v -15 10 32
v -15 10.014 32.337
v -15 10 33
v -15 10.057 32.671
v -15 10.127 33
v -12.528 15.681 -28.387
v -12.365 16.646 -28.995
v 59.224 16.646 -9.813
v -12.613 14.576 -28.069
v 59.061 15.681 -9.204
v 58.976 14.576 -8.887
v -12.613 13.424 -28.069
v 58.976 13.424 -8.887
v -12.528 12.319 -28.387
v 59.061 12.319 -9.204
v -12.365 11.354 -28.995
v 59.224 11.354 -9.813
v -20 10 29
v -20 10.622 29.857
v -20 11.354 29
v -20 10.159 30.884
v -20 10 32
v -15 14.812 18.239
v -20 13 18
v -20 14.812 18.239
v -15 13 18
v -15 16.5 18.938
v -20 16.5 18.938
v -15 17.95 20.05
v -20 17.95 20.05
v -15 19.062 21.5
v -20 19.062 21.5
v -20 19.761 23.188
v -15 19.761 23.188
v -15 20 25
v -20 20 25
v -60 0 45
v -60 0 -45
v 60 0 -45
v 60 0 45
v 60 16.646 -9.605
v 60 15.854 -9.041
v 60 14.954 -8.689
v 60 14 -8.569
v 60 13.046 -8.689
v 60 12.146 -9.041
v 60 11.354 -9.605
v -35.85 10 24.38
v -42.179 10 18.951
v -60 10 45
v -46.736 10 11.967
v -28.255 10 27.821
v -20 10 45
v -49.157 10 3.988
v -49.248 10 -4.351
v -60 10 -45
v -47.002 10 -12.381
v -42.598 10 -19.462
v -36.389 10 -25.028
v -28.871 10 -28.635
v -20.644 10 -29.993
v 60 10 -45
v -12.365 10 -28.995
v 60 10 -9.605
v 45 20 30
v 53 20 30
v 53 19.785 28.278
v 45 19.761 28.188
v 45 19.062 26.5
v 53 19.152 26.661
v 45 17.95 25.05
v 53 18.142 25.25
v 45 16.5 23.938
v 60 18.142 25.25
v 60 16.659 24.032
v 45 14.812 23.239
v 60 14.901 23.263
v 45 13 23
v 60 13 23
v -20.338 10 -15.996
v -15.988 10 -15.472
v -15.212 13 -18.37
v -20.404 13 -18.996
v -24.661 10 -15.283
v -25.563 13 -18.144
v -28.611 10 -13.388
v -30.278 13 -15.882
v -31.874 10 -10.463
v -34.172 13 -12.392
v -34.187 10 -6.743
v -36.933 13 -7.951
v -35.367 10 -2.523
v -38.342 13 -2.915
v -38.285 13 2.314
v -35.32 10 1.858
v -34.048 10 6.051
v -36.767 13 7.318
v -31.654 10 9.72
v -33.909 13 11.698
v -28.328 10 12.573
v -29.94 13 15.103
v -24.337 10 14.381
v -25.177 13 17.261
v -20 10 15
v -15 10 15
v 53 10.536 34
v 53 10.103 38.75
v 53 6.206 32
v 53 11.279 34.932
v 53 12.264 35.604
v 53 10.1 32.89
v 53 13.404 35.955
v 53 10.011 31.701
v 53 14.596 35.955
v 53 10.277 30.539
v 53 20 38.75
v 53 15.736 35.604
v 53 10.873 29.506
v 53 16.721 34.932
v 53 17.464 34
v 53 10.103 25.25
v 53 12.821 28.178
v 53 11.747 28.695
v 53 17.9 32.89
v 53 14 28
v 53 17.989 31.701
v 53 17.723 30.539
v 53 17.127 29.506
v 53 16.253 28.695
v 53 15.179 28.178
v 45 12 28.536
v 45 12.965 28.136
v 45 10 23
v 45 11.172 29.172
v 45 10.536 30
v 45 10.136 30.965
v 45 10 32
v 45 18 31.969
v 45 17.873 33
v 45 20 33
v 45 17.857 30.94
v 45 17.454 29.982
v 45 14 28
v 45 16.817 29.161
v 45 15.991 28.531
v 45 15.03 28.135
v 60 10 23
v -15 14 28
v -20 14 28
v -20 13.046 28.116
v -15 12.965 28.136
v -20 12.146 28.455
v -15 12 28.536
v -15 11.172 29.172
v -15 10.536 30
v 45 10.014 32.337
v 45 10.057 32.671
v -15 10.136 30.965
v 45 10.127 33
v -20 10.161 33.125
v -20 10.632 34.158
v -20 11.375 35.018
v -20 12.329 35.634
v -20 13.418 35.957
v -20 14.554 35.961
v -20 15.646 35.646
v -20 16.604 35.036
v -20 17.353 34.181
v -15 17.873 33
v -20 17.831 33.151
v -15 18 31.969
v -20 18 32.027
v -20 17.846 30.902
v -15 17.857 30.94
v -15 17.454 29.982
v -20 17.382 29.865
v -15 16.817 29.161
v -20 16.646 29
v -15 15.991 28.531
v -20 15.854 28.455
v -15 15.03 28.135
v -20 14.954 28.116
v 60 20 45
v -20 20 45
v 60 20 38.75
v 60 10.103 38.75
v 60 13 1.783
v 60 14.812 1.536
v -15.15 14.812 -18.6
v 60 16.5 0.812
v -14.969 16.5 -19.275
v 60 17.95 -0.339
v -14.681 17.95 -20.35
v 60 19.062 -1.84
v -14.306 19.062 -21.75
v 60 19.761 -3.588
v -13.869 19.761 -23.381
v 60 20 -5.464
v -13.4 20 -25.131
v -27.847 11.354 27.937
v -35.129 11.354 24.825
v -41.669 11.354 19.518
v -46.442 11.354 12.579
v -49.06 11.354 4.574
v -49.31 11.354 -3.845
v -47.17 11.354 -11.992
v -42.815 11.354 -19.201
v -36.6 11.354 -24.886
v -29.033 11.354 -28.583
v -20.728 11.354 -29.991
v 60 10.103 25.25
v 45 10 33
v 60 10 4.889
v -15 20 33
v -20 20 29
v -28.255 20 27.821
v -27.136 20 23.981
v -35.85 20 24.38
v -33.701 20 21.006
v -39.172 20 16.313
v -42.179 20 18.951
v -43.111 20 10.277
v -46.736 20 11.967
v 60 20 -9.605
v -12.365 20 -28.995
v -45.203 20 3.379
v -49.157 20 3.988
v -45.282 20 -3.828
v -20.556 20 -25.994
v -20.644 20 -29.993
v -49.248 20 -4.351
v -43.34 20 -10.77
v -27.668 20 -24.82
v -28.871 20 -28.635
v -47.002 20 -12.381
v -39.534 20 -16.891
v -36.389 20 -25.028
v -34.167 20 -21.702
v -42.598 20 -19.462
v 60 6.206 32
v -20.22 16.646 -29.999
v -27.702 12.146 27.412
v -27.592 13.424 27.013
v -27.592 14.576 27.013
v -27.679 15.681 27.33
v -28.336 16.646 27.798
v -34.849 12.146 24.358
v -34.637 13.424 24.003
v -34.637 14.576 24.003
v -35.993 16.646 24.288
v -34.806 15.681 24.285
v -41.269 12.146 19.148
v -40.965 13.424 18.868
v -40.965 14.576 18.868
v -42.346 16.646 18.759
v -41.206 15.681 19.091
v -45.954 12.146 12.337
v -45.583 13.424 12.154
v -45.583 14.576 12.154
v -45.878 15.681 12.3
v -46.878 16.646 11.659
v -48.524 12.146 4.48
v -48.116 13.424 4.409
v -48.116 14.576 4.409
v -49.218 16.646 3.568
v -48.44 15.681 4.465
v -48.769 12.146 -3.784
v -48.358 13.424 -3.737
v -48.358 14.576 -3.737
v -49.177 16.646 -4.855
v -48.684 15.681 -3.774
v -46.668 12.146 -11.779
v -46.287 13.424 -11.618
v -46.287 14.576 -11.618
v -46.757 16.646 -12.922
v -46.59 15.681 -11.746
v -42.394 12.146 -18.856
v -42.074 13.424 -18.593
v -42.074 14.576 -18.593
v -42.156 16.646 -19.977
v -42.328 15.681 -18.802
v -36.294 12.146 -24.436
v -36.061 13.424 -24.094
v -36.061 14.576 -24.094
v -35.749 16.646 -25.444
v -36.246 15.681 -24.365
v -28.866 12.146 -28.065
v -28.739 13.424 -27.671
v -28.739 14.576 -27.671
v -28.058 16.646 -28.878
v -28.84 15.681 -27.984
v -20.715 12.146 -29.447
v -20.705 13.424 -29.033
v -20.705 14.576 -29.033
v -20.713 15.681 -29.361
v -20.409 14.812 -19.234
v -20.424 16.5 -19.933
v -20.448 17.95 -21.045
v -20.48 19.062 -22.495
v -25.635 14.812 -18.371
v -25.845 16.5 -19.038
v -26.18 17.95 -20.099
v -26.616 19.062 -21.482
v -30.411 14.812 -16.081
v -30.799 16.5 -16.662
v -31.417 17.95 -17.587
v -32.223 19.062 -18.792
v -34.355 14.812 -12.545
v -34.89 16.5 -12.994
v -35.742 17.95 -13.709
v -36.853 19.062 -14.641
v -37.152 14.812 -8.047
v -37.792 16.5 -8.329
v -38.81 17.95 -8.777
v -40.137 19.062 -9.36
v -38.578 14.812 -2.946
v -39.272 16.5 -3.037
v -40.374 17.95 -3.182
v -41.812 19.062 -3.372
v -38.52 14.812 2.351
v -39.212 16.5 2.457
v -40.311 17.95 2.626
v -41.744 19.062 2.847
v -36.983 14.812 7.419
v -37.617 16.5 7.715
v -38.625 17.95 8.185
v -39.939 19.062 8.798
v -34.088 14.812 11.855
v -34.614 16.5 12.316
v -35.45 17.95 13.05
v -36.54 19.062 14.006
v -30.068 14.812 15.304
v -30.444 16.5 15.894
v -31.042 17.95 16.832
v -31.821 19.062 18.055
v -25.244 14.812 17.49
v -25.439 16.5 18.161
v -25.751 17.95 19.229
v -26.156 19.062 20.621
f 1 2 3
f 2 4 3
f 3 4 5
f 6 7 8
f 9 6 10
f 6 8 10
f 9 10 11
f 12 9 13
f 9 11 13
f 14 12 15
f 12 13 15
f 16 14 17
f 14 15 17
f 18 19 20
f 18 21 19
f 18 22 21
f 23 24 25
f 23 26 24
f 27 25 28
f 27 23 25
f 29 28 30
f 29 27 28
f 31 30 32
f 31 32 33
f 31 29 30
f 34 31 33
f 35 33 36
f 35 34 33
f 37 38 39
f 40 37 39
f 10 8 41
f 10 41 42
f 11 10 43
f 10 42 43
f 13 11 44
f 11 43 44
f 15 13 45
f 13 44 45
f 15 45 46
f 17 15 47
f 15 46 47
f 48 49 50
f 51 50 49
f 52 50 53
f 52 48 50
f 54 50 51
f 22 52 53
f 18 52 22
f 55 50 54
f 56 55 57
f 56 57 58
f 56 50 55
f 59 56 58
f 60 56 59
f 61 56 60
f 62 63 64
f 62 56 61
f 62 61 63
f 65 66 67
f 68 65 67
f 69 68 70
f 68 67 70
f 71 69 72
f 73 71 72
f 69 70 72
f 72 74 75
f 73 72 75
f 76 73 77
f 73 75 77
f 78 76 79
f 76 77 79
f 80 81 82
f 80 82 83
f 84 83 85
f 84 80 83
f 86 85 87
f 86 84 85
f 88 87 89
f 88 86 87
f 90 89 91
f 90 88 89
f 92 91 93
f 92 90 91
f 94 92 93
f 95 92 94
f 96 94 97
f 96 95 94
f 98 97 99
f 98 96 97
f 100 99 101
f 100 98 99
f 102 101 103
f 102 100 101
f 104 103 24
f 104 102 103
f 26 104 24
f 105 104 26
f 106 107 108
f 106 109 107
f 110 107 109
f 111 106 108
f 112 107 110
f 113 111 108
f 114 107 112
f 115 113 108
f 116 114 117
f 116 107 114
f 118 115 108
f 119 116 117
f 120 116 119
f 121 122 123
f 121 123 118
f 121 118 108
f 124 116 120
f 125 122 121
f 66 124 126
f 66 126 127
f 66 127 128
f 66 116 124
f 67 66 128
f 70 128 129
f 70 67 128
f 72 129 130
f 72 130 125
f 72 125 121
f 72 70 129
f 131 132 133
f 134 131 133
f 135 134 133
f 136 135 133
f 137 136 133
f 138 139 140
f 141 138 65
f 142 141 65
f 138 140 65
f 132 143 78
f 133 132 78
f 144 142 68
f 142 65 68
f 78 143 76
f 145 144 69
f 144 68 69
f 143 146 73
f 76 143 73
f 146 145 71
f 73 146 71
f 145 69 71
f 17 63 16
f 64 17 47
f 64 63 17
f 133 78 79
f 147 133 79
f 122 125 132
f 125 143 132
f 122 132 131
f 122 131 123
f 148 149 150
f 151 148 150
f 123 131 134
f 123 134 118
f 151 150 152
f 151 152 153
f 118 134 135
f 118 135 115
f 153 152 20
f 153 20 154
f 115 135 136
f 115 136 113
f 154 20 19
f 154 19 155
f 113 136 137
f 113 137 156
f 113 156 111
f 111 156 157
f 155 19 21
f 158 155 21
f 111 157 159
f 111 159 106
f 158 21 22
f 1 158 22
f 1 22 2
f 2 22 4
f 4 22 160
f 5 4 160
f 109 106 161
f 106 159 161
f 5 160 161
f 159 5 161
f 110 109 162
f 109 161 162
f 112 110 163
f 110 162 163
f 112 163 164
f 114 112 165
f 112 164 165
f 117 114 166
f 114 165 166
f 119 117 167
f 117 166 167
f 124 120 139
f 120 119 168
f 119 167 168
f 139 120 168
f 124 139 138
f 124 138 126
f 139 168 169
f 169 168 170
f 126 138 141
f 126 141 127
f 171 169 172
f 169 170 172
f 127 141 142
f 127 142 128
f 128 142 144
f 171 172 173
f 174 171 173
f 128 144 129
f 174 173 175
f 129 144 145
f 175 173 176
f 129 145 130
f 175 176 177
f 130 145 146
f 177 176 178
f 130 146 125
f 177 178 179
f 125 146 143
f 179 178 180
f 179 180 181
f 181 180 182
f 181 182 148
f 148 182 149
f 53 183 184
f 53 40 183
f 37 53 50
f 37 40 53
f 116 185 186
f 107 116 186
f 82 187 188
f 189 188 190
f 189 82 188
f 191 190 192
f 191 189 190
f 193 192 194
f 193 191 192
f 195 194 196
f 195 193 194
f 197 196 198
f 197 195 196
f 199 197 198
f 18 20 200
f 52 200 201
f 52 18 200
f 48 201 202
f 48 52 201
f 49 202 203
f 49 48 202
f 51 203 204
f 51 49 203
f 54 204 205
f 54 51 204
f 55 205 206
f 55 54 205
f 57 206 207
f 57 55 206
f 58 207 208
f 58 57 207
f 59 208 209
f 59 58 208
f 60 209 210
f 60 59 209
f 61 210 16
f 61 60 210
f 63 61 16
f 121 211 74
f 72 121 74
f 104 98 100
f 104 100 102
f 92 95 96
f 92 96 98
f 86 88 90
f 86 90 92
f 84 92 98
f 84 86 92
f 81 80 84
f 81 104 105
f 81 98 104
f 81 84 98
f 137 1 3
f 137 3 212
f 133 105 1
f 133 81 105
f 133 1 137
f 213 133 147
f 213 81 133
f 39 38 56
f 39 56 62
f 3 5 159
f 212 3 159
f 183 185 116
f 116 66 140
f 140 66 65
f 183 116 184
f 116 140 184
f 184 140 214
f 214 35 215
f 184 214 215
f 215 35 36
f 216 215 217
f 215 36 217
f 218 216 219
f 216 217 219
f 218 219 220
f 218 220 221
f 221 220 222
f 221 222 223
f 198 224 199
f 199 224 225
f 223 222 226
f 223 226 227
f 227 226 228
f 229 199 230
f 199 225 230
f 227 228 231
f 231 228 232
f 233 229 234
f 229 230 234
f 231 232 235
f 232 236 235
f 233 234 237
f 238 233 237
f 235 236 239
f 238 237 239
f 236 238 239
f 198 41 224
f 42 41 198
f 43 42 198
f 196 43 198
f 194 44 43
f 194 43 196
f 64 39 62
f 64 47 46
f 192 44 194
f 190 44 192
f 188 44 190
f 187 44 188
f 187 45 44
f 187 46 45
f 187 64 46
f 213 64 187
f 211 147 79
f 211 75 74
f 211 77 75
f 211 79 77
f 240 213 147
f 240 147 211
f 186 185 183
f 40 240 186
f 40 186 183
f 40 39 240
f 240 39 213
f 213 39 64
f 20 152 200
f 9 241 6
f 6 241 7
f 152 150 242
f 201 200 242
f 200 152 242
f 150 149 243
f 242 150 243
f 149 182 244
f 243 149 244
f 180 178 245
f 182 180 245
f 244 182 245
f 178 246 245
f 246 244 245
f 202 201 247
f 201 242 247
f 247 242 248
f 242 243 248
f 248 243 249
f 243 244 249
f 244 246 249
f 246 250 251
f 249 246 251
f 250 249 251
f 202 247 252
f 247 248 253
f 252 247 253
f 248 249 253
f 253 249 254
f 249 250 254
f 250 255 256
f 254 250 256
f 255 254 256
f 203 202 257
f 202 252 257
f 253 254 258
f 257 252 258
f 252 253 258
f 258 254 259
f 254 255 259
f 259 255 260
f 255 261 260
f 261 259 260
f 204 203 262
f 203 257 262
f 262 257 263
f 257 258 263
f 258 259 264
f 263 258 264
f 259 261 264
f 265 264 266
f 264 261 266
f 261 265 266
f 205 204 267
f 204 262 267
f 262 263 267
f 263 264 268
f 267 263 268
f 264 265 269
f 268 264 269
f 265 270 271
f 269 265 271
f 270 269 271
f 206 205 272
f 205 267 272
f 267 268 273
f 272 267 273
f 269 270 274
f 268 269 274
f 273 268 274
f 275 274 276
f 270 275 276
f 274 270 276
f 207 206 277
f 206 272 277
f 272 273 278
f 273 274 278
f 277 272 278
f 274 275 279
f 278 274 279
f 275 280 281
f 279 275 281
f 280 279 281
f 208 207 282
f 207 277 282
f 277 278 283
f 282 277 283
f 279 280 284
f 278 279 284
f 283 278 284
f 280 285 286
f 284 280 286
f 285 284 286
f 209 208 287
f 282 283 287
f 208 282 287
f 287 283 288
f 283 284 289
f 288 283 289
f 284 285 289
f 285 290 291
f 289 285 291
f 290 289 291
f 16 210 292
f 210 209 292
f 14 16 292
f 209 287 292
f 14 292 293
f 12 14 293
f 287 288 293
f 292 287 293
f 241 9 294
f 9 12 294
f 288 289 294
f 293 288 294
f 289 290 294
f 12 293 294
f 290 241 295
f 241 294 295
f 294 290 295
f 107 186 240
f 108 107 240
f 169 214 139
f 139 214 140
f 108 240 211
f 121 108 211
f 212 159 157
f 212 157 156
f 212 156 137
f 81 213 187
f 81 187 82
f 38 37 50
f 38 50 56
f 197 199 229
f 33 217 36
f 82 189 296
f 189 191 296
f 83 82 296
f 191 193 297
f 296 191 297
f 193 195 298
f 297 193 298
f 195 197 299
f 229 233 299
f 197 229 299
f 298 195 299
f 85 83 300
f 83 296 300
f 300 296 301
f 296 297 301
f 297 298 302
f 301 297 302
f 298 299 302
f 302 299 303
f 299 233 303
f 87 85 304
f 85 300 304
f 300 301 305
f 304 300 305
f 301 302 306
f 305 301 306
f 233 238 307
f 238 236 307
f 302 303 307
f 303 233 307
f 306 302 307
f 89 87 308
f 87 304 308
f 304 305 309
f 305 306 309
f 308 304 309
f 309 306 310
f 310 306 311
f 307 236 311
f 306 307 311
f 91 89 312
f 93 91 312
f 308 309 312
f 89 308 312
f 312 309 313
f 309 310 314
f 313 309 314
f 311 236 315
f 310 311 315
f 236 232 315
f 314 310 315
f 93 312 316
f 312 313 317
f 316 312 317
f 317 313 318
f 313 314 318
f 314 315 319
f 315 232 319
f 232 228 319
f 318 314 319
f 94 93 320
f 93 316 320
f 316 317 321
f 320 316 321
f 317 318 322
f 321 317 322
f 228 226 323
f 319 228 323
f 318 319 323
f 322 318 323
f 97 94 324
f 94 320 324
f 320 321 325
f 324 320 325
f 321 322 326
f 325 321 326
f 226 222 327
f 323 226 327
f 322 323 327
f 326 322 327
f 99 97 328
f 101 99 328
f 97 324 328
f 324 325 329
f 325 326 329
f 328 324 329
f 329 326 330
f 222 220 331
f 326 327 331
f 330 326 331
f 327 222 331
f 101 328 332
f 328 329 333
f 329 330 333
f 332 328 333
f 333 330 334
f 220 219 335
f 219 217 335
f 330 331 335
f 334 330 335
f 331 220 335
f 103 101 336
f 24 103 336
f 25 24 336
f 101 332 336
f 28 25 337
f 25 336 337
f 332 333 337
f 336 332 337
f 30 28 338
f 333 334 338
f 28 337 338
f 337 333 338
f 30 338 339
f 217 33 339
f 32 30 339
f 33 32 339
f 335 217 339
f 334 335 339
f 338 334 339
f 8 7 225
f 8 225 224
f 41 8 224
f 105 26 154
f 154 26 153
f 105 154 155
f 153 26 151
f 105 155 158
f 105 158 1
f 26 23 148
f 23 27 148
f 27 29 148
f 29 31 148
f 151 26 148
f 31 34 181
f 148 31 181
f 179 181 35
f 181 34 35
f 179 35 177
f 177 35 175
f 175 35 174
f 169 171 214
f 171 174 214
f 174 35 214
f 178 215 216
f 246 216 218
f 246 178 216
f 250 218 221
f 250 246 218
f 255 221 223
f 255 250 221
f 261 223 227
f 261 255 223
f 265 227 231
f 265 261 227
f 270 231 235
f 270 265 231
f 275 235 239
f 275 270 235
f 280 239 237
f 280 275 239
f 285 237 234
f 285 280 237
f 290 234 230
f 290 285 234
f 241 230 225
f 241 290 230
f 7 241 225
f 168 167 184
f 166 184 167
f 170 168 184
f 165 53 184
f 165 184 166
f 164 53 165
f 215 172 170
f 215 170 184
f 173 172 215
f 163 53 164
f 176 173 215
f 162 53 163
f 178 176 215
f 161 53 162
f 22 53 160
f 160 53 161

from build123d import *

# Parameters (mm, degrees)
SKETCH1_W           = 120
SKETCH1_H           = 90
BOSS_EXTRUDE1_DEPTH = 10
BOSS_EXTRUDE2_DEPTH = 10
SKETCH3_R           = 4
CUT_EXTRUDE1_DEPTH  = 10
CHAMFER2_SIZE       = 3
FILLET1_R           = 7
CUT_EXTRUDE2_DEPTH  = 7


with BuildPart() as part:
    # Sketch1 → Boss-Extrude1 (new body)
    with BuildSketch(Plane(origin=(0, 0, 0), x_dir=(1, 0, 0), z_dir=(0, 1, 0))):
        Rectangle(SKETCH1_W, SKETCH1_H)
    extrude(amount=BOSS_EXTRUDE1_DEPTH)

    # Sketch2 → Boss-Extrude2 (add)
    with BuildSketch(Plane(origin=(0, 10, 0), x_dir=(1, 0, 0), z_dir=(0, 1, 0))):
        with BuildLine():
            Line((60, -45), (-20, -45))
            Line((-20, -45), (-20, -29))
            ThreePointArc((-20, -29), (-49.247623411, 4.35052267), (-12.364838169, 28.994811876))
            Line((-12.364838169, 28.994811876), (60, 9.604711928))
            Line((60, 9.604711928), (60, -29))
            Line((60, -29), (60, -45))
        make_face()
    extrude(amount=BOSS_EXTRUDE2_DEPTH)

    # Cut-Sweep1: sweep along a path in Sketch4
    with BuildLine(Plane(origin=(0, 14, 0), x_dir=(1, 0, 0), z_dir=(0, 1, 0))) as cut_sweep1_path:
        Line((60, -32), (-20, -32))
        ThreePointArc((-20, -32), (-52.221957995, 4.742101247), (-11.588381034, 31.892589354))
        Line((-11.588381034, 31.892589354), (60, 12.710540469))
        Line((60, 12.710540469), (80.97534387, 7.090214018))
    # Sketch3 → Cut-Sweep1 (sweep, cut)
    with BuildSketch(Plane(origin=(60, 0, 0), x_dir=(0, 0, -1), z_dir=(1, 0, 0))):
        with Locations((-32, 14)):
            Circle(SKETCH3_R)
    sweep(path=cut_sweep1_path.line, mode=Mode.SUBTRACT)

    # Sketch5 → Cut-Extrude1 (cut)
    with BuildSketch(Plane(origin=(0, 20, 0), x_dir=(1, 0, 0), z_dir=(0, 1, 0))):
        with BuildLine():
            Line((-15, -18), (-15, -33))
            Line((-15, -33), (45, -33))
            Line((45, -33), (45, -23))
            Line((45, -23), (60, -23))
            Line((60, -23), (60, -1.783326057))
            Line((60, -1.783326057), (-15.211847666, 18.369627786))
            ThreePointArc((-15.211847666, 18.369627786), (-38.341729935, 2.914734556), (-20, -18))
            Line((-20, -18), (-15, -18))
        make_face()
    extrude(amount=-CUT_EXTRUDE1_DEPTH, mode=Mode.SUBTRACT)

    # Chamfer2
    chamfer2_edges = [part.edges().sort_by_distance(p)[0] for p in [
        (22.394076167, 10, -8.293150865),
        (-17.5, 10, 18),
        (-38.341729935, 10, -2.914734556),
    ]]
    chamfer(chamfer2_edges, length=CHAMFER2_SIZE)

    # Fillet1
    fillet1_edges = [part.edges().sort_by_distance(p)[0] for p in [
        (-17.5, 20, 18),
        (-38.341729935, 20, -2.914734556),
        (22.394076167, 20, -8.293150865),
        (52.5, 20, 23),
    ]]
    fillet(fillet1_edges, radius=FILLET1_R - 0.0001)  # a hair under: the kernel refuses the full size

    # Sketch6 → Cut-Extrude2 (cut)
    with BuildSketch(Plane(origin=(60, 0, 0), x_dir=(0, 0, -1), z_dir=(1, 0, 0))):
        Polygon((-32, 6.205771366), (-25.25, 10.102885683), (-25.25, 20), (-38.75, 20), (-38.75, 10.102885683), align=None)
    extrude(amount=-CUT_EXTRUDE2_DEPTH, mode=Mode.SUBTRACT)


solid = part.part
